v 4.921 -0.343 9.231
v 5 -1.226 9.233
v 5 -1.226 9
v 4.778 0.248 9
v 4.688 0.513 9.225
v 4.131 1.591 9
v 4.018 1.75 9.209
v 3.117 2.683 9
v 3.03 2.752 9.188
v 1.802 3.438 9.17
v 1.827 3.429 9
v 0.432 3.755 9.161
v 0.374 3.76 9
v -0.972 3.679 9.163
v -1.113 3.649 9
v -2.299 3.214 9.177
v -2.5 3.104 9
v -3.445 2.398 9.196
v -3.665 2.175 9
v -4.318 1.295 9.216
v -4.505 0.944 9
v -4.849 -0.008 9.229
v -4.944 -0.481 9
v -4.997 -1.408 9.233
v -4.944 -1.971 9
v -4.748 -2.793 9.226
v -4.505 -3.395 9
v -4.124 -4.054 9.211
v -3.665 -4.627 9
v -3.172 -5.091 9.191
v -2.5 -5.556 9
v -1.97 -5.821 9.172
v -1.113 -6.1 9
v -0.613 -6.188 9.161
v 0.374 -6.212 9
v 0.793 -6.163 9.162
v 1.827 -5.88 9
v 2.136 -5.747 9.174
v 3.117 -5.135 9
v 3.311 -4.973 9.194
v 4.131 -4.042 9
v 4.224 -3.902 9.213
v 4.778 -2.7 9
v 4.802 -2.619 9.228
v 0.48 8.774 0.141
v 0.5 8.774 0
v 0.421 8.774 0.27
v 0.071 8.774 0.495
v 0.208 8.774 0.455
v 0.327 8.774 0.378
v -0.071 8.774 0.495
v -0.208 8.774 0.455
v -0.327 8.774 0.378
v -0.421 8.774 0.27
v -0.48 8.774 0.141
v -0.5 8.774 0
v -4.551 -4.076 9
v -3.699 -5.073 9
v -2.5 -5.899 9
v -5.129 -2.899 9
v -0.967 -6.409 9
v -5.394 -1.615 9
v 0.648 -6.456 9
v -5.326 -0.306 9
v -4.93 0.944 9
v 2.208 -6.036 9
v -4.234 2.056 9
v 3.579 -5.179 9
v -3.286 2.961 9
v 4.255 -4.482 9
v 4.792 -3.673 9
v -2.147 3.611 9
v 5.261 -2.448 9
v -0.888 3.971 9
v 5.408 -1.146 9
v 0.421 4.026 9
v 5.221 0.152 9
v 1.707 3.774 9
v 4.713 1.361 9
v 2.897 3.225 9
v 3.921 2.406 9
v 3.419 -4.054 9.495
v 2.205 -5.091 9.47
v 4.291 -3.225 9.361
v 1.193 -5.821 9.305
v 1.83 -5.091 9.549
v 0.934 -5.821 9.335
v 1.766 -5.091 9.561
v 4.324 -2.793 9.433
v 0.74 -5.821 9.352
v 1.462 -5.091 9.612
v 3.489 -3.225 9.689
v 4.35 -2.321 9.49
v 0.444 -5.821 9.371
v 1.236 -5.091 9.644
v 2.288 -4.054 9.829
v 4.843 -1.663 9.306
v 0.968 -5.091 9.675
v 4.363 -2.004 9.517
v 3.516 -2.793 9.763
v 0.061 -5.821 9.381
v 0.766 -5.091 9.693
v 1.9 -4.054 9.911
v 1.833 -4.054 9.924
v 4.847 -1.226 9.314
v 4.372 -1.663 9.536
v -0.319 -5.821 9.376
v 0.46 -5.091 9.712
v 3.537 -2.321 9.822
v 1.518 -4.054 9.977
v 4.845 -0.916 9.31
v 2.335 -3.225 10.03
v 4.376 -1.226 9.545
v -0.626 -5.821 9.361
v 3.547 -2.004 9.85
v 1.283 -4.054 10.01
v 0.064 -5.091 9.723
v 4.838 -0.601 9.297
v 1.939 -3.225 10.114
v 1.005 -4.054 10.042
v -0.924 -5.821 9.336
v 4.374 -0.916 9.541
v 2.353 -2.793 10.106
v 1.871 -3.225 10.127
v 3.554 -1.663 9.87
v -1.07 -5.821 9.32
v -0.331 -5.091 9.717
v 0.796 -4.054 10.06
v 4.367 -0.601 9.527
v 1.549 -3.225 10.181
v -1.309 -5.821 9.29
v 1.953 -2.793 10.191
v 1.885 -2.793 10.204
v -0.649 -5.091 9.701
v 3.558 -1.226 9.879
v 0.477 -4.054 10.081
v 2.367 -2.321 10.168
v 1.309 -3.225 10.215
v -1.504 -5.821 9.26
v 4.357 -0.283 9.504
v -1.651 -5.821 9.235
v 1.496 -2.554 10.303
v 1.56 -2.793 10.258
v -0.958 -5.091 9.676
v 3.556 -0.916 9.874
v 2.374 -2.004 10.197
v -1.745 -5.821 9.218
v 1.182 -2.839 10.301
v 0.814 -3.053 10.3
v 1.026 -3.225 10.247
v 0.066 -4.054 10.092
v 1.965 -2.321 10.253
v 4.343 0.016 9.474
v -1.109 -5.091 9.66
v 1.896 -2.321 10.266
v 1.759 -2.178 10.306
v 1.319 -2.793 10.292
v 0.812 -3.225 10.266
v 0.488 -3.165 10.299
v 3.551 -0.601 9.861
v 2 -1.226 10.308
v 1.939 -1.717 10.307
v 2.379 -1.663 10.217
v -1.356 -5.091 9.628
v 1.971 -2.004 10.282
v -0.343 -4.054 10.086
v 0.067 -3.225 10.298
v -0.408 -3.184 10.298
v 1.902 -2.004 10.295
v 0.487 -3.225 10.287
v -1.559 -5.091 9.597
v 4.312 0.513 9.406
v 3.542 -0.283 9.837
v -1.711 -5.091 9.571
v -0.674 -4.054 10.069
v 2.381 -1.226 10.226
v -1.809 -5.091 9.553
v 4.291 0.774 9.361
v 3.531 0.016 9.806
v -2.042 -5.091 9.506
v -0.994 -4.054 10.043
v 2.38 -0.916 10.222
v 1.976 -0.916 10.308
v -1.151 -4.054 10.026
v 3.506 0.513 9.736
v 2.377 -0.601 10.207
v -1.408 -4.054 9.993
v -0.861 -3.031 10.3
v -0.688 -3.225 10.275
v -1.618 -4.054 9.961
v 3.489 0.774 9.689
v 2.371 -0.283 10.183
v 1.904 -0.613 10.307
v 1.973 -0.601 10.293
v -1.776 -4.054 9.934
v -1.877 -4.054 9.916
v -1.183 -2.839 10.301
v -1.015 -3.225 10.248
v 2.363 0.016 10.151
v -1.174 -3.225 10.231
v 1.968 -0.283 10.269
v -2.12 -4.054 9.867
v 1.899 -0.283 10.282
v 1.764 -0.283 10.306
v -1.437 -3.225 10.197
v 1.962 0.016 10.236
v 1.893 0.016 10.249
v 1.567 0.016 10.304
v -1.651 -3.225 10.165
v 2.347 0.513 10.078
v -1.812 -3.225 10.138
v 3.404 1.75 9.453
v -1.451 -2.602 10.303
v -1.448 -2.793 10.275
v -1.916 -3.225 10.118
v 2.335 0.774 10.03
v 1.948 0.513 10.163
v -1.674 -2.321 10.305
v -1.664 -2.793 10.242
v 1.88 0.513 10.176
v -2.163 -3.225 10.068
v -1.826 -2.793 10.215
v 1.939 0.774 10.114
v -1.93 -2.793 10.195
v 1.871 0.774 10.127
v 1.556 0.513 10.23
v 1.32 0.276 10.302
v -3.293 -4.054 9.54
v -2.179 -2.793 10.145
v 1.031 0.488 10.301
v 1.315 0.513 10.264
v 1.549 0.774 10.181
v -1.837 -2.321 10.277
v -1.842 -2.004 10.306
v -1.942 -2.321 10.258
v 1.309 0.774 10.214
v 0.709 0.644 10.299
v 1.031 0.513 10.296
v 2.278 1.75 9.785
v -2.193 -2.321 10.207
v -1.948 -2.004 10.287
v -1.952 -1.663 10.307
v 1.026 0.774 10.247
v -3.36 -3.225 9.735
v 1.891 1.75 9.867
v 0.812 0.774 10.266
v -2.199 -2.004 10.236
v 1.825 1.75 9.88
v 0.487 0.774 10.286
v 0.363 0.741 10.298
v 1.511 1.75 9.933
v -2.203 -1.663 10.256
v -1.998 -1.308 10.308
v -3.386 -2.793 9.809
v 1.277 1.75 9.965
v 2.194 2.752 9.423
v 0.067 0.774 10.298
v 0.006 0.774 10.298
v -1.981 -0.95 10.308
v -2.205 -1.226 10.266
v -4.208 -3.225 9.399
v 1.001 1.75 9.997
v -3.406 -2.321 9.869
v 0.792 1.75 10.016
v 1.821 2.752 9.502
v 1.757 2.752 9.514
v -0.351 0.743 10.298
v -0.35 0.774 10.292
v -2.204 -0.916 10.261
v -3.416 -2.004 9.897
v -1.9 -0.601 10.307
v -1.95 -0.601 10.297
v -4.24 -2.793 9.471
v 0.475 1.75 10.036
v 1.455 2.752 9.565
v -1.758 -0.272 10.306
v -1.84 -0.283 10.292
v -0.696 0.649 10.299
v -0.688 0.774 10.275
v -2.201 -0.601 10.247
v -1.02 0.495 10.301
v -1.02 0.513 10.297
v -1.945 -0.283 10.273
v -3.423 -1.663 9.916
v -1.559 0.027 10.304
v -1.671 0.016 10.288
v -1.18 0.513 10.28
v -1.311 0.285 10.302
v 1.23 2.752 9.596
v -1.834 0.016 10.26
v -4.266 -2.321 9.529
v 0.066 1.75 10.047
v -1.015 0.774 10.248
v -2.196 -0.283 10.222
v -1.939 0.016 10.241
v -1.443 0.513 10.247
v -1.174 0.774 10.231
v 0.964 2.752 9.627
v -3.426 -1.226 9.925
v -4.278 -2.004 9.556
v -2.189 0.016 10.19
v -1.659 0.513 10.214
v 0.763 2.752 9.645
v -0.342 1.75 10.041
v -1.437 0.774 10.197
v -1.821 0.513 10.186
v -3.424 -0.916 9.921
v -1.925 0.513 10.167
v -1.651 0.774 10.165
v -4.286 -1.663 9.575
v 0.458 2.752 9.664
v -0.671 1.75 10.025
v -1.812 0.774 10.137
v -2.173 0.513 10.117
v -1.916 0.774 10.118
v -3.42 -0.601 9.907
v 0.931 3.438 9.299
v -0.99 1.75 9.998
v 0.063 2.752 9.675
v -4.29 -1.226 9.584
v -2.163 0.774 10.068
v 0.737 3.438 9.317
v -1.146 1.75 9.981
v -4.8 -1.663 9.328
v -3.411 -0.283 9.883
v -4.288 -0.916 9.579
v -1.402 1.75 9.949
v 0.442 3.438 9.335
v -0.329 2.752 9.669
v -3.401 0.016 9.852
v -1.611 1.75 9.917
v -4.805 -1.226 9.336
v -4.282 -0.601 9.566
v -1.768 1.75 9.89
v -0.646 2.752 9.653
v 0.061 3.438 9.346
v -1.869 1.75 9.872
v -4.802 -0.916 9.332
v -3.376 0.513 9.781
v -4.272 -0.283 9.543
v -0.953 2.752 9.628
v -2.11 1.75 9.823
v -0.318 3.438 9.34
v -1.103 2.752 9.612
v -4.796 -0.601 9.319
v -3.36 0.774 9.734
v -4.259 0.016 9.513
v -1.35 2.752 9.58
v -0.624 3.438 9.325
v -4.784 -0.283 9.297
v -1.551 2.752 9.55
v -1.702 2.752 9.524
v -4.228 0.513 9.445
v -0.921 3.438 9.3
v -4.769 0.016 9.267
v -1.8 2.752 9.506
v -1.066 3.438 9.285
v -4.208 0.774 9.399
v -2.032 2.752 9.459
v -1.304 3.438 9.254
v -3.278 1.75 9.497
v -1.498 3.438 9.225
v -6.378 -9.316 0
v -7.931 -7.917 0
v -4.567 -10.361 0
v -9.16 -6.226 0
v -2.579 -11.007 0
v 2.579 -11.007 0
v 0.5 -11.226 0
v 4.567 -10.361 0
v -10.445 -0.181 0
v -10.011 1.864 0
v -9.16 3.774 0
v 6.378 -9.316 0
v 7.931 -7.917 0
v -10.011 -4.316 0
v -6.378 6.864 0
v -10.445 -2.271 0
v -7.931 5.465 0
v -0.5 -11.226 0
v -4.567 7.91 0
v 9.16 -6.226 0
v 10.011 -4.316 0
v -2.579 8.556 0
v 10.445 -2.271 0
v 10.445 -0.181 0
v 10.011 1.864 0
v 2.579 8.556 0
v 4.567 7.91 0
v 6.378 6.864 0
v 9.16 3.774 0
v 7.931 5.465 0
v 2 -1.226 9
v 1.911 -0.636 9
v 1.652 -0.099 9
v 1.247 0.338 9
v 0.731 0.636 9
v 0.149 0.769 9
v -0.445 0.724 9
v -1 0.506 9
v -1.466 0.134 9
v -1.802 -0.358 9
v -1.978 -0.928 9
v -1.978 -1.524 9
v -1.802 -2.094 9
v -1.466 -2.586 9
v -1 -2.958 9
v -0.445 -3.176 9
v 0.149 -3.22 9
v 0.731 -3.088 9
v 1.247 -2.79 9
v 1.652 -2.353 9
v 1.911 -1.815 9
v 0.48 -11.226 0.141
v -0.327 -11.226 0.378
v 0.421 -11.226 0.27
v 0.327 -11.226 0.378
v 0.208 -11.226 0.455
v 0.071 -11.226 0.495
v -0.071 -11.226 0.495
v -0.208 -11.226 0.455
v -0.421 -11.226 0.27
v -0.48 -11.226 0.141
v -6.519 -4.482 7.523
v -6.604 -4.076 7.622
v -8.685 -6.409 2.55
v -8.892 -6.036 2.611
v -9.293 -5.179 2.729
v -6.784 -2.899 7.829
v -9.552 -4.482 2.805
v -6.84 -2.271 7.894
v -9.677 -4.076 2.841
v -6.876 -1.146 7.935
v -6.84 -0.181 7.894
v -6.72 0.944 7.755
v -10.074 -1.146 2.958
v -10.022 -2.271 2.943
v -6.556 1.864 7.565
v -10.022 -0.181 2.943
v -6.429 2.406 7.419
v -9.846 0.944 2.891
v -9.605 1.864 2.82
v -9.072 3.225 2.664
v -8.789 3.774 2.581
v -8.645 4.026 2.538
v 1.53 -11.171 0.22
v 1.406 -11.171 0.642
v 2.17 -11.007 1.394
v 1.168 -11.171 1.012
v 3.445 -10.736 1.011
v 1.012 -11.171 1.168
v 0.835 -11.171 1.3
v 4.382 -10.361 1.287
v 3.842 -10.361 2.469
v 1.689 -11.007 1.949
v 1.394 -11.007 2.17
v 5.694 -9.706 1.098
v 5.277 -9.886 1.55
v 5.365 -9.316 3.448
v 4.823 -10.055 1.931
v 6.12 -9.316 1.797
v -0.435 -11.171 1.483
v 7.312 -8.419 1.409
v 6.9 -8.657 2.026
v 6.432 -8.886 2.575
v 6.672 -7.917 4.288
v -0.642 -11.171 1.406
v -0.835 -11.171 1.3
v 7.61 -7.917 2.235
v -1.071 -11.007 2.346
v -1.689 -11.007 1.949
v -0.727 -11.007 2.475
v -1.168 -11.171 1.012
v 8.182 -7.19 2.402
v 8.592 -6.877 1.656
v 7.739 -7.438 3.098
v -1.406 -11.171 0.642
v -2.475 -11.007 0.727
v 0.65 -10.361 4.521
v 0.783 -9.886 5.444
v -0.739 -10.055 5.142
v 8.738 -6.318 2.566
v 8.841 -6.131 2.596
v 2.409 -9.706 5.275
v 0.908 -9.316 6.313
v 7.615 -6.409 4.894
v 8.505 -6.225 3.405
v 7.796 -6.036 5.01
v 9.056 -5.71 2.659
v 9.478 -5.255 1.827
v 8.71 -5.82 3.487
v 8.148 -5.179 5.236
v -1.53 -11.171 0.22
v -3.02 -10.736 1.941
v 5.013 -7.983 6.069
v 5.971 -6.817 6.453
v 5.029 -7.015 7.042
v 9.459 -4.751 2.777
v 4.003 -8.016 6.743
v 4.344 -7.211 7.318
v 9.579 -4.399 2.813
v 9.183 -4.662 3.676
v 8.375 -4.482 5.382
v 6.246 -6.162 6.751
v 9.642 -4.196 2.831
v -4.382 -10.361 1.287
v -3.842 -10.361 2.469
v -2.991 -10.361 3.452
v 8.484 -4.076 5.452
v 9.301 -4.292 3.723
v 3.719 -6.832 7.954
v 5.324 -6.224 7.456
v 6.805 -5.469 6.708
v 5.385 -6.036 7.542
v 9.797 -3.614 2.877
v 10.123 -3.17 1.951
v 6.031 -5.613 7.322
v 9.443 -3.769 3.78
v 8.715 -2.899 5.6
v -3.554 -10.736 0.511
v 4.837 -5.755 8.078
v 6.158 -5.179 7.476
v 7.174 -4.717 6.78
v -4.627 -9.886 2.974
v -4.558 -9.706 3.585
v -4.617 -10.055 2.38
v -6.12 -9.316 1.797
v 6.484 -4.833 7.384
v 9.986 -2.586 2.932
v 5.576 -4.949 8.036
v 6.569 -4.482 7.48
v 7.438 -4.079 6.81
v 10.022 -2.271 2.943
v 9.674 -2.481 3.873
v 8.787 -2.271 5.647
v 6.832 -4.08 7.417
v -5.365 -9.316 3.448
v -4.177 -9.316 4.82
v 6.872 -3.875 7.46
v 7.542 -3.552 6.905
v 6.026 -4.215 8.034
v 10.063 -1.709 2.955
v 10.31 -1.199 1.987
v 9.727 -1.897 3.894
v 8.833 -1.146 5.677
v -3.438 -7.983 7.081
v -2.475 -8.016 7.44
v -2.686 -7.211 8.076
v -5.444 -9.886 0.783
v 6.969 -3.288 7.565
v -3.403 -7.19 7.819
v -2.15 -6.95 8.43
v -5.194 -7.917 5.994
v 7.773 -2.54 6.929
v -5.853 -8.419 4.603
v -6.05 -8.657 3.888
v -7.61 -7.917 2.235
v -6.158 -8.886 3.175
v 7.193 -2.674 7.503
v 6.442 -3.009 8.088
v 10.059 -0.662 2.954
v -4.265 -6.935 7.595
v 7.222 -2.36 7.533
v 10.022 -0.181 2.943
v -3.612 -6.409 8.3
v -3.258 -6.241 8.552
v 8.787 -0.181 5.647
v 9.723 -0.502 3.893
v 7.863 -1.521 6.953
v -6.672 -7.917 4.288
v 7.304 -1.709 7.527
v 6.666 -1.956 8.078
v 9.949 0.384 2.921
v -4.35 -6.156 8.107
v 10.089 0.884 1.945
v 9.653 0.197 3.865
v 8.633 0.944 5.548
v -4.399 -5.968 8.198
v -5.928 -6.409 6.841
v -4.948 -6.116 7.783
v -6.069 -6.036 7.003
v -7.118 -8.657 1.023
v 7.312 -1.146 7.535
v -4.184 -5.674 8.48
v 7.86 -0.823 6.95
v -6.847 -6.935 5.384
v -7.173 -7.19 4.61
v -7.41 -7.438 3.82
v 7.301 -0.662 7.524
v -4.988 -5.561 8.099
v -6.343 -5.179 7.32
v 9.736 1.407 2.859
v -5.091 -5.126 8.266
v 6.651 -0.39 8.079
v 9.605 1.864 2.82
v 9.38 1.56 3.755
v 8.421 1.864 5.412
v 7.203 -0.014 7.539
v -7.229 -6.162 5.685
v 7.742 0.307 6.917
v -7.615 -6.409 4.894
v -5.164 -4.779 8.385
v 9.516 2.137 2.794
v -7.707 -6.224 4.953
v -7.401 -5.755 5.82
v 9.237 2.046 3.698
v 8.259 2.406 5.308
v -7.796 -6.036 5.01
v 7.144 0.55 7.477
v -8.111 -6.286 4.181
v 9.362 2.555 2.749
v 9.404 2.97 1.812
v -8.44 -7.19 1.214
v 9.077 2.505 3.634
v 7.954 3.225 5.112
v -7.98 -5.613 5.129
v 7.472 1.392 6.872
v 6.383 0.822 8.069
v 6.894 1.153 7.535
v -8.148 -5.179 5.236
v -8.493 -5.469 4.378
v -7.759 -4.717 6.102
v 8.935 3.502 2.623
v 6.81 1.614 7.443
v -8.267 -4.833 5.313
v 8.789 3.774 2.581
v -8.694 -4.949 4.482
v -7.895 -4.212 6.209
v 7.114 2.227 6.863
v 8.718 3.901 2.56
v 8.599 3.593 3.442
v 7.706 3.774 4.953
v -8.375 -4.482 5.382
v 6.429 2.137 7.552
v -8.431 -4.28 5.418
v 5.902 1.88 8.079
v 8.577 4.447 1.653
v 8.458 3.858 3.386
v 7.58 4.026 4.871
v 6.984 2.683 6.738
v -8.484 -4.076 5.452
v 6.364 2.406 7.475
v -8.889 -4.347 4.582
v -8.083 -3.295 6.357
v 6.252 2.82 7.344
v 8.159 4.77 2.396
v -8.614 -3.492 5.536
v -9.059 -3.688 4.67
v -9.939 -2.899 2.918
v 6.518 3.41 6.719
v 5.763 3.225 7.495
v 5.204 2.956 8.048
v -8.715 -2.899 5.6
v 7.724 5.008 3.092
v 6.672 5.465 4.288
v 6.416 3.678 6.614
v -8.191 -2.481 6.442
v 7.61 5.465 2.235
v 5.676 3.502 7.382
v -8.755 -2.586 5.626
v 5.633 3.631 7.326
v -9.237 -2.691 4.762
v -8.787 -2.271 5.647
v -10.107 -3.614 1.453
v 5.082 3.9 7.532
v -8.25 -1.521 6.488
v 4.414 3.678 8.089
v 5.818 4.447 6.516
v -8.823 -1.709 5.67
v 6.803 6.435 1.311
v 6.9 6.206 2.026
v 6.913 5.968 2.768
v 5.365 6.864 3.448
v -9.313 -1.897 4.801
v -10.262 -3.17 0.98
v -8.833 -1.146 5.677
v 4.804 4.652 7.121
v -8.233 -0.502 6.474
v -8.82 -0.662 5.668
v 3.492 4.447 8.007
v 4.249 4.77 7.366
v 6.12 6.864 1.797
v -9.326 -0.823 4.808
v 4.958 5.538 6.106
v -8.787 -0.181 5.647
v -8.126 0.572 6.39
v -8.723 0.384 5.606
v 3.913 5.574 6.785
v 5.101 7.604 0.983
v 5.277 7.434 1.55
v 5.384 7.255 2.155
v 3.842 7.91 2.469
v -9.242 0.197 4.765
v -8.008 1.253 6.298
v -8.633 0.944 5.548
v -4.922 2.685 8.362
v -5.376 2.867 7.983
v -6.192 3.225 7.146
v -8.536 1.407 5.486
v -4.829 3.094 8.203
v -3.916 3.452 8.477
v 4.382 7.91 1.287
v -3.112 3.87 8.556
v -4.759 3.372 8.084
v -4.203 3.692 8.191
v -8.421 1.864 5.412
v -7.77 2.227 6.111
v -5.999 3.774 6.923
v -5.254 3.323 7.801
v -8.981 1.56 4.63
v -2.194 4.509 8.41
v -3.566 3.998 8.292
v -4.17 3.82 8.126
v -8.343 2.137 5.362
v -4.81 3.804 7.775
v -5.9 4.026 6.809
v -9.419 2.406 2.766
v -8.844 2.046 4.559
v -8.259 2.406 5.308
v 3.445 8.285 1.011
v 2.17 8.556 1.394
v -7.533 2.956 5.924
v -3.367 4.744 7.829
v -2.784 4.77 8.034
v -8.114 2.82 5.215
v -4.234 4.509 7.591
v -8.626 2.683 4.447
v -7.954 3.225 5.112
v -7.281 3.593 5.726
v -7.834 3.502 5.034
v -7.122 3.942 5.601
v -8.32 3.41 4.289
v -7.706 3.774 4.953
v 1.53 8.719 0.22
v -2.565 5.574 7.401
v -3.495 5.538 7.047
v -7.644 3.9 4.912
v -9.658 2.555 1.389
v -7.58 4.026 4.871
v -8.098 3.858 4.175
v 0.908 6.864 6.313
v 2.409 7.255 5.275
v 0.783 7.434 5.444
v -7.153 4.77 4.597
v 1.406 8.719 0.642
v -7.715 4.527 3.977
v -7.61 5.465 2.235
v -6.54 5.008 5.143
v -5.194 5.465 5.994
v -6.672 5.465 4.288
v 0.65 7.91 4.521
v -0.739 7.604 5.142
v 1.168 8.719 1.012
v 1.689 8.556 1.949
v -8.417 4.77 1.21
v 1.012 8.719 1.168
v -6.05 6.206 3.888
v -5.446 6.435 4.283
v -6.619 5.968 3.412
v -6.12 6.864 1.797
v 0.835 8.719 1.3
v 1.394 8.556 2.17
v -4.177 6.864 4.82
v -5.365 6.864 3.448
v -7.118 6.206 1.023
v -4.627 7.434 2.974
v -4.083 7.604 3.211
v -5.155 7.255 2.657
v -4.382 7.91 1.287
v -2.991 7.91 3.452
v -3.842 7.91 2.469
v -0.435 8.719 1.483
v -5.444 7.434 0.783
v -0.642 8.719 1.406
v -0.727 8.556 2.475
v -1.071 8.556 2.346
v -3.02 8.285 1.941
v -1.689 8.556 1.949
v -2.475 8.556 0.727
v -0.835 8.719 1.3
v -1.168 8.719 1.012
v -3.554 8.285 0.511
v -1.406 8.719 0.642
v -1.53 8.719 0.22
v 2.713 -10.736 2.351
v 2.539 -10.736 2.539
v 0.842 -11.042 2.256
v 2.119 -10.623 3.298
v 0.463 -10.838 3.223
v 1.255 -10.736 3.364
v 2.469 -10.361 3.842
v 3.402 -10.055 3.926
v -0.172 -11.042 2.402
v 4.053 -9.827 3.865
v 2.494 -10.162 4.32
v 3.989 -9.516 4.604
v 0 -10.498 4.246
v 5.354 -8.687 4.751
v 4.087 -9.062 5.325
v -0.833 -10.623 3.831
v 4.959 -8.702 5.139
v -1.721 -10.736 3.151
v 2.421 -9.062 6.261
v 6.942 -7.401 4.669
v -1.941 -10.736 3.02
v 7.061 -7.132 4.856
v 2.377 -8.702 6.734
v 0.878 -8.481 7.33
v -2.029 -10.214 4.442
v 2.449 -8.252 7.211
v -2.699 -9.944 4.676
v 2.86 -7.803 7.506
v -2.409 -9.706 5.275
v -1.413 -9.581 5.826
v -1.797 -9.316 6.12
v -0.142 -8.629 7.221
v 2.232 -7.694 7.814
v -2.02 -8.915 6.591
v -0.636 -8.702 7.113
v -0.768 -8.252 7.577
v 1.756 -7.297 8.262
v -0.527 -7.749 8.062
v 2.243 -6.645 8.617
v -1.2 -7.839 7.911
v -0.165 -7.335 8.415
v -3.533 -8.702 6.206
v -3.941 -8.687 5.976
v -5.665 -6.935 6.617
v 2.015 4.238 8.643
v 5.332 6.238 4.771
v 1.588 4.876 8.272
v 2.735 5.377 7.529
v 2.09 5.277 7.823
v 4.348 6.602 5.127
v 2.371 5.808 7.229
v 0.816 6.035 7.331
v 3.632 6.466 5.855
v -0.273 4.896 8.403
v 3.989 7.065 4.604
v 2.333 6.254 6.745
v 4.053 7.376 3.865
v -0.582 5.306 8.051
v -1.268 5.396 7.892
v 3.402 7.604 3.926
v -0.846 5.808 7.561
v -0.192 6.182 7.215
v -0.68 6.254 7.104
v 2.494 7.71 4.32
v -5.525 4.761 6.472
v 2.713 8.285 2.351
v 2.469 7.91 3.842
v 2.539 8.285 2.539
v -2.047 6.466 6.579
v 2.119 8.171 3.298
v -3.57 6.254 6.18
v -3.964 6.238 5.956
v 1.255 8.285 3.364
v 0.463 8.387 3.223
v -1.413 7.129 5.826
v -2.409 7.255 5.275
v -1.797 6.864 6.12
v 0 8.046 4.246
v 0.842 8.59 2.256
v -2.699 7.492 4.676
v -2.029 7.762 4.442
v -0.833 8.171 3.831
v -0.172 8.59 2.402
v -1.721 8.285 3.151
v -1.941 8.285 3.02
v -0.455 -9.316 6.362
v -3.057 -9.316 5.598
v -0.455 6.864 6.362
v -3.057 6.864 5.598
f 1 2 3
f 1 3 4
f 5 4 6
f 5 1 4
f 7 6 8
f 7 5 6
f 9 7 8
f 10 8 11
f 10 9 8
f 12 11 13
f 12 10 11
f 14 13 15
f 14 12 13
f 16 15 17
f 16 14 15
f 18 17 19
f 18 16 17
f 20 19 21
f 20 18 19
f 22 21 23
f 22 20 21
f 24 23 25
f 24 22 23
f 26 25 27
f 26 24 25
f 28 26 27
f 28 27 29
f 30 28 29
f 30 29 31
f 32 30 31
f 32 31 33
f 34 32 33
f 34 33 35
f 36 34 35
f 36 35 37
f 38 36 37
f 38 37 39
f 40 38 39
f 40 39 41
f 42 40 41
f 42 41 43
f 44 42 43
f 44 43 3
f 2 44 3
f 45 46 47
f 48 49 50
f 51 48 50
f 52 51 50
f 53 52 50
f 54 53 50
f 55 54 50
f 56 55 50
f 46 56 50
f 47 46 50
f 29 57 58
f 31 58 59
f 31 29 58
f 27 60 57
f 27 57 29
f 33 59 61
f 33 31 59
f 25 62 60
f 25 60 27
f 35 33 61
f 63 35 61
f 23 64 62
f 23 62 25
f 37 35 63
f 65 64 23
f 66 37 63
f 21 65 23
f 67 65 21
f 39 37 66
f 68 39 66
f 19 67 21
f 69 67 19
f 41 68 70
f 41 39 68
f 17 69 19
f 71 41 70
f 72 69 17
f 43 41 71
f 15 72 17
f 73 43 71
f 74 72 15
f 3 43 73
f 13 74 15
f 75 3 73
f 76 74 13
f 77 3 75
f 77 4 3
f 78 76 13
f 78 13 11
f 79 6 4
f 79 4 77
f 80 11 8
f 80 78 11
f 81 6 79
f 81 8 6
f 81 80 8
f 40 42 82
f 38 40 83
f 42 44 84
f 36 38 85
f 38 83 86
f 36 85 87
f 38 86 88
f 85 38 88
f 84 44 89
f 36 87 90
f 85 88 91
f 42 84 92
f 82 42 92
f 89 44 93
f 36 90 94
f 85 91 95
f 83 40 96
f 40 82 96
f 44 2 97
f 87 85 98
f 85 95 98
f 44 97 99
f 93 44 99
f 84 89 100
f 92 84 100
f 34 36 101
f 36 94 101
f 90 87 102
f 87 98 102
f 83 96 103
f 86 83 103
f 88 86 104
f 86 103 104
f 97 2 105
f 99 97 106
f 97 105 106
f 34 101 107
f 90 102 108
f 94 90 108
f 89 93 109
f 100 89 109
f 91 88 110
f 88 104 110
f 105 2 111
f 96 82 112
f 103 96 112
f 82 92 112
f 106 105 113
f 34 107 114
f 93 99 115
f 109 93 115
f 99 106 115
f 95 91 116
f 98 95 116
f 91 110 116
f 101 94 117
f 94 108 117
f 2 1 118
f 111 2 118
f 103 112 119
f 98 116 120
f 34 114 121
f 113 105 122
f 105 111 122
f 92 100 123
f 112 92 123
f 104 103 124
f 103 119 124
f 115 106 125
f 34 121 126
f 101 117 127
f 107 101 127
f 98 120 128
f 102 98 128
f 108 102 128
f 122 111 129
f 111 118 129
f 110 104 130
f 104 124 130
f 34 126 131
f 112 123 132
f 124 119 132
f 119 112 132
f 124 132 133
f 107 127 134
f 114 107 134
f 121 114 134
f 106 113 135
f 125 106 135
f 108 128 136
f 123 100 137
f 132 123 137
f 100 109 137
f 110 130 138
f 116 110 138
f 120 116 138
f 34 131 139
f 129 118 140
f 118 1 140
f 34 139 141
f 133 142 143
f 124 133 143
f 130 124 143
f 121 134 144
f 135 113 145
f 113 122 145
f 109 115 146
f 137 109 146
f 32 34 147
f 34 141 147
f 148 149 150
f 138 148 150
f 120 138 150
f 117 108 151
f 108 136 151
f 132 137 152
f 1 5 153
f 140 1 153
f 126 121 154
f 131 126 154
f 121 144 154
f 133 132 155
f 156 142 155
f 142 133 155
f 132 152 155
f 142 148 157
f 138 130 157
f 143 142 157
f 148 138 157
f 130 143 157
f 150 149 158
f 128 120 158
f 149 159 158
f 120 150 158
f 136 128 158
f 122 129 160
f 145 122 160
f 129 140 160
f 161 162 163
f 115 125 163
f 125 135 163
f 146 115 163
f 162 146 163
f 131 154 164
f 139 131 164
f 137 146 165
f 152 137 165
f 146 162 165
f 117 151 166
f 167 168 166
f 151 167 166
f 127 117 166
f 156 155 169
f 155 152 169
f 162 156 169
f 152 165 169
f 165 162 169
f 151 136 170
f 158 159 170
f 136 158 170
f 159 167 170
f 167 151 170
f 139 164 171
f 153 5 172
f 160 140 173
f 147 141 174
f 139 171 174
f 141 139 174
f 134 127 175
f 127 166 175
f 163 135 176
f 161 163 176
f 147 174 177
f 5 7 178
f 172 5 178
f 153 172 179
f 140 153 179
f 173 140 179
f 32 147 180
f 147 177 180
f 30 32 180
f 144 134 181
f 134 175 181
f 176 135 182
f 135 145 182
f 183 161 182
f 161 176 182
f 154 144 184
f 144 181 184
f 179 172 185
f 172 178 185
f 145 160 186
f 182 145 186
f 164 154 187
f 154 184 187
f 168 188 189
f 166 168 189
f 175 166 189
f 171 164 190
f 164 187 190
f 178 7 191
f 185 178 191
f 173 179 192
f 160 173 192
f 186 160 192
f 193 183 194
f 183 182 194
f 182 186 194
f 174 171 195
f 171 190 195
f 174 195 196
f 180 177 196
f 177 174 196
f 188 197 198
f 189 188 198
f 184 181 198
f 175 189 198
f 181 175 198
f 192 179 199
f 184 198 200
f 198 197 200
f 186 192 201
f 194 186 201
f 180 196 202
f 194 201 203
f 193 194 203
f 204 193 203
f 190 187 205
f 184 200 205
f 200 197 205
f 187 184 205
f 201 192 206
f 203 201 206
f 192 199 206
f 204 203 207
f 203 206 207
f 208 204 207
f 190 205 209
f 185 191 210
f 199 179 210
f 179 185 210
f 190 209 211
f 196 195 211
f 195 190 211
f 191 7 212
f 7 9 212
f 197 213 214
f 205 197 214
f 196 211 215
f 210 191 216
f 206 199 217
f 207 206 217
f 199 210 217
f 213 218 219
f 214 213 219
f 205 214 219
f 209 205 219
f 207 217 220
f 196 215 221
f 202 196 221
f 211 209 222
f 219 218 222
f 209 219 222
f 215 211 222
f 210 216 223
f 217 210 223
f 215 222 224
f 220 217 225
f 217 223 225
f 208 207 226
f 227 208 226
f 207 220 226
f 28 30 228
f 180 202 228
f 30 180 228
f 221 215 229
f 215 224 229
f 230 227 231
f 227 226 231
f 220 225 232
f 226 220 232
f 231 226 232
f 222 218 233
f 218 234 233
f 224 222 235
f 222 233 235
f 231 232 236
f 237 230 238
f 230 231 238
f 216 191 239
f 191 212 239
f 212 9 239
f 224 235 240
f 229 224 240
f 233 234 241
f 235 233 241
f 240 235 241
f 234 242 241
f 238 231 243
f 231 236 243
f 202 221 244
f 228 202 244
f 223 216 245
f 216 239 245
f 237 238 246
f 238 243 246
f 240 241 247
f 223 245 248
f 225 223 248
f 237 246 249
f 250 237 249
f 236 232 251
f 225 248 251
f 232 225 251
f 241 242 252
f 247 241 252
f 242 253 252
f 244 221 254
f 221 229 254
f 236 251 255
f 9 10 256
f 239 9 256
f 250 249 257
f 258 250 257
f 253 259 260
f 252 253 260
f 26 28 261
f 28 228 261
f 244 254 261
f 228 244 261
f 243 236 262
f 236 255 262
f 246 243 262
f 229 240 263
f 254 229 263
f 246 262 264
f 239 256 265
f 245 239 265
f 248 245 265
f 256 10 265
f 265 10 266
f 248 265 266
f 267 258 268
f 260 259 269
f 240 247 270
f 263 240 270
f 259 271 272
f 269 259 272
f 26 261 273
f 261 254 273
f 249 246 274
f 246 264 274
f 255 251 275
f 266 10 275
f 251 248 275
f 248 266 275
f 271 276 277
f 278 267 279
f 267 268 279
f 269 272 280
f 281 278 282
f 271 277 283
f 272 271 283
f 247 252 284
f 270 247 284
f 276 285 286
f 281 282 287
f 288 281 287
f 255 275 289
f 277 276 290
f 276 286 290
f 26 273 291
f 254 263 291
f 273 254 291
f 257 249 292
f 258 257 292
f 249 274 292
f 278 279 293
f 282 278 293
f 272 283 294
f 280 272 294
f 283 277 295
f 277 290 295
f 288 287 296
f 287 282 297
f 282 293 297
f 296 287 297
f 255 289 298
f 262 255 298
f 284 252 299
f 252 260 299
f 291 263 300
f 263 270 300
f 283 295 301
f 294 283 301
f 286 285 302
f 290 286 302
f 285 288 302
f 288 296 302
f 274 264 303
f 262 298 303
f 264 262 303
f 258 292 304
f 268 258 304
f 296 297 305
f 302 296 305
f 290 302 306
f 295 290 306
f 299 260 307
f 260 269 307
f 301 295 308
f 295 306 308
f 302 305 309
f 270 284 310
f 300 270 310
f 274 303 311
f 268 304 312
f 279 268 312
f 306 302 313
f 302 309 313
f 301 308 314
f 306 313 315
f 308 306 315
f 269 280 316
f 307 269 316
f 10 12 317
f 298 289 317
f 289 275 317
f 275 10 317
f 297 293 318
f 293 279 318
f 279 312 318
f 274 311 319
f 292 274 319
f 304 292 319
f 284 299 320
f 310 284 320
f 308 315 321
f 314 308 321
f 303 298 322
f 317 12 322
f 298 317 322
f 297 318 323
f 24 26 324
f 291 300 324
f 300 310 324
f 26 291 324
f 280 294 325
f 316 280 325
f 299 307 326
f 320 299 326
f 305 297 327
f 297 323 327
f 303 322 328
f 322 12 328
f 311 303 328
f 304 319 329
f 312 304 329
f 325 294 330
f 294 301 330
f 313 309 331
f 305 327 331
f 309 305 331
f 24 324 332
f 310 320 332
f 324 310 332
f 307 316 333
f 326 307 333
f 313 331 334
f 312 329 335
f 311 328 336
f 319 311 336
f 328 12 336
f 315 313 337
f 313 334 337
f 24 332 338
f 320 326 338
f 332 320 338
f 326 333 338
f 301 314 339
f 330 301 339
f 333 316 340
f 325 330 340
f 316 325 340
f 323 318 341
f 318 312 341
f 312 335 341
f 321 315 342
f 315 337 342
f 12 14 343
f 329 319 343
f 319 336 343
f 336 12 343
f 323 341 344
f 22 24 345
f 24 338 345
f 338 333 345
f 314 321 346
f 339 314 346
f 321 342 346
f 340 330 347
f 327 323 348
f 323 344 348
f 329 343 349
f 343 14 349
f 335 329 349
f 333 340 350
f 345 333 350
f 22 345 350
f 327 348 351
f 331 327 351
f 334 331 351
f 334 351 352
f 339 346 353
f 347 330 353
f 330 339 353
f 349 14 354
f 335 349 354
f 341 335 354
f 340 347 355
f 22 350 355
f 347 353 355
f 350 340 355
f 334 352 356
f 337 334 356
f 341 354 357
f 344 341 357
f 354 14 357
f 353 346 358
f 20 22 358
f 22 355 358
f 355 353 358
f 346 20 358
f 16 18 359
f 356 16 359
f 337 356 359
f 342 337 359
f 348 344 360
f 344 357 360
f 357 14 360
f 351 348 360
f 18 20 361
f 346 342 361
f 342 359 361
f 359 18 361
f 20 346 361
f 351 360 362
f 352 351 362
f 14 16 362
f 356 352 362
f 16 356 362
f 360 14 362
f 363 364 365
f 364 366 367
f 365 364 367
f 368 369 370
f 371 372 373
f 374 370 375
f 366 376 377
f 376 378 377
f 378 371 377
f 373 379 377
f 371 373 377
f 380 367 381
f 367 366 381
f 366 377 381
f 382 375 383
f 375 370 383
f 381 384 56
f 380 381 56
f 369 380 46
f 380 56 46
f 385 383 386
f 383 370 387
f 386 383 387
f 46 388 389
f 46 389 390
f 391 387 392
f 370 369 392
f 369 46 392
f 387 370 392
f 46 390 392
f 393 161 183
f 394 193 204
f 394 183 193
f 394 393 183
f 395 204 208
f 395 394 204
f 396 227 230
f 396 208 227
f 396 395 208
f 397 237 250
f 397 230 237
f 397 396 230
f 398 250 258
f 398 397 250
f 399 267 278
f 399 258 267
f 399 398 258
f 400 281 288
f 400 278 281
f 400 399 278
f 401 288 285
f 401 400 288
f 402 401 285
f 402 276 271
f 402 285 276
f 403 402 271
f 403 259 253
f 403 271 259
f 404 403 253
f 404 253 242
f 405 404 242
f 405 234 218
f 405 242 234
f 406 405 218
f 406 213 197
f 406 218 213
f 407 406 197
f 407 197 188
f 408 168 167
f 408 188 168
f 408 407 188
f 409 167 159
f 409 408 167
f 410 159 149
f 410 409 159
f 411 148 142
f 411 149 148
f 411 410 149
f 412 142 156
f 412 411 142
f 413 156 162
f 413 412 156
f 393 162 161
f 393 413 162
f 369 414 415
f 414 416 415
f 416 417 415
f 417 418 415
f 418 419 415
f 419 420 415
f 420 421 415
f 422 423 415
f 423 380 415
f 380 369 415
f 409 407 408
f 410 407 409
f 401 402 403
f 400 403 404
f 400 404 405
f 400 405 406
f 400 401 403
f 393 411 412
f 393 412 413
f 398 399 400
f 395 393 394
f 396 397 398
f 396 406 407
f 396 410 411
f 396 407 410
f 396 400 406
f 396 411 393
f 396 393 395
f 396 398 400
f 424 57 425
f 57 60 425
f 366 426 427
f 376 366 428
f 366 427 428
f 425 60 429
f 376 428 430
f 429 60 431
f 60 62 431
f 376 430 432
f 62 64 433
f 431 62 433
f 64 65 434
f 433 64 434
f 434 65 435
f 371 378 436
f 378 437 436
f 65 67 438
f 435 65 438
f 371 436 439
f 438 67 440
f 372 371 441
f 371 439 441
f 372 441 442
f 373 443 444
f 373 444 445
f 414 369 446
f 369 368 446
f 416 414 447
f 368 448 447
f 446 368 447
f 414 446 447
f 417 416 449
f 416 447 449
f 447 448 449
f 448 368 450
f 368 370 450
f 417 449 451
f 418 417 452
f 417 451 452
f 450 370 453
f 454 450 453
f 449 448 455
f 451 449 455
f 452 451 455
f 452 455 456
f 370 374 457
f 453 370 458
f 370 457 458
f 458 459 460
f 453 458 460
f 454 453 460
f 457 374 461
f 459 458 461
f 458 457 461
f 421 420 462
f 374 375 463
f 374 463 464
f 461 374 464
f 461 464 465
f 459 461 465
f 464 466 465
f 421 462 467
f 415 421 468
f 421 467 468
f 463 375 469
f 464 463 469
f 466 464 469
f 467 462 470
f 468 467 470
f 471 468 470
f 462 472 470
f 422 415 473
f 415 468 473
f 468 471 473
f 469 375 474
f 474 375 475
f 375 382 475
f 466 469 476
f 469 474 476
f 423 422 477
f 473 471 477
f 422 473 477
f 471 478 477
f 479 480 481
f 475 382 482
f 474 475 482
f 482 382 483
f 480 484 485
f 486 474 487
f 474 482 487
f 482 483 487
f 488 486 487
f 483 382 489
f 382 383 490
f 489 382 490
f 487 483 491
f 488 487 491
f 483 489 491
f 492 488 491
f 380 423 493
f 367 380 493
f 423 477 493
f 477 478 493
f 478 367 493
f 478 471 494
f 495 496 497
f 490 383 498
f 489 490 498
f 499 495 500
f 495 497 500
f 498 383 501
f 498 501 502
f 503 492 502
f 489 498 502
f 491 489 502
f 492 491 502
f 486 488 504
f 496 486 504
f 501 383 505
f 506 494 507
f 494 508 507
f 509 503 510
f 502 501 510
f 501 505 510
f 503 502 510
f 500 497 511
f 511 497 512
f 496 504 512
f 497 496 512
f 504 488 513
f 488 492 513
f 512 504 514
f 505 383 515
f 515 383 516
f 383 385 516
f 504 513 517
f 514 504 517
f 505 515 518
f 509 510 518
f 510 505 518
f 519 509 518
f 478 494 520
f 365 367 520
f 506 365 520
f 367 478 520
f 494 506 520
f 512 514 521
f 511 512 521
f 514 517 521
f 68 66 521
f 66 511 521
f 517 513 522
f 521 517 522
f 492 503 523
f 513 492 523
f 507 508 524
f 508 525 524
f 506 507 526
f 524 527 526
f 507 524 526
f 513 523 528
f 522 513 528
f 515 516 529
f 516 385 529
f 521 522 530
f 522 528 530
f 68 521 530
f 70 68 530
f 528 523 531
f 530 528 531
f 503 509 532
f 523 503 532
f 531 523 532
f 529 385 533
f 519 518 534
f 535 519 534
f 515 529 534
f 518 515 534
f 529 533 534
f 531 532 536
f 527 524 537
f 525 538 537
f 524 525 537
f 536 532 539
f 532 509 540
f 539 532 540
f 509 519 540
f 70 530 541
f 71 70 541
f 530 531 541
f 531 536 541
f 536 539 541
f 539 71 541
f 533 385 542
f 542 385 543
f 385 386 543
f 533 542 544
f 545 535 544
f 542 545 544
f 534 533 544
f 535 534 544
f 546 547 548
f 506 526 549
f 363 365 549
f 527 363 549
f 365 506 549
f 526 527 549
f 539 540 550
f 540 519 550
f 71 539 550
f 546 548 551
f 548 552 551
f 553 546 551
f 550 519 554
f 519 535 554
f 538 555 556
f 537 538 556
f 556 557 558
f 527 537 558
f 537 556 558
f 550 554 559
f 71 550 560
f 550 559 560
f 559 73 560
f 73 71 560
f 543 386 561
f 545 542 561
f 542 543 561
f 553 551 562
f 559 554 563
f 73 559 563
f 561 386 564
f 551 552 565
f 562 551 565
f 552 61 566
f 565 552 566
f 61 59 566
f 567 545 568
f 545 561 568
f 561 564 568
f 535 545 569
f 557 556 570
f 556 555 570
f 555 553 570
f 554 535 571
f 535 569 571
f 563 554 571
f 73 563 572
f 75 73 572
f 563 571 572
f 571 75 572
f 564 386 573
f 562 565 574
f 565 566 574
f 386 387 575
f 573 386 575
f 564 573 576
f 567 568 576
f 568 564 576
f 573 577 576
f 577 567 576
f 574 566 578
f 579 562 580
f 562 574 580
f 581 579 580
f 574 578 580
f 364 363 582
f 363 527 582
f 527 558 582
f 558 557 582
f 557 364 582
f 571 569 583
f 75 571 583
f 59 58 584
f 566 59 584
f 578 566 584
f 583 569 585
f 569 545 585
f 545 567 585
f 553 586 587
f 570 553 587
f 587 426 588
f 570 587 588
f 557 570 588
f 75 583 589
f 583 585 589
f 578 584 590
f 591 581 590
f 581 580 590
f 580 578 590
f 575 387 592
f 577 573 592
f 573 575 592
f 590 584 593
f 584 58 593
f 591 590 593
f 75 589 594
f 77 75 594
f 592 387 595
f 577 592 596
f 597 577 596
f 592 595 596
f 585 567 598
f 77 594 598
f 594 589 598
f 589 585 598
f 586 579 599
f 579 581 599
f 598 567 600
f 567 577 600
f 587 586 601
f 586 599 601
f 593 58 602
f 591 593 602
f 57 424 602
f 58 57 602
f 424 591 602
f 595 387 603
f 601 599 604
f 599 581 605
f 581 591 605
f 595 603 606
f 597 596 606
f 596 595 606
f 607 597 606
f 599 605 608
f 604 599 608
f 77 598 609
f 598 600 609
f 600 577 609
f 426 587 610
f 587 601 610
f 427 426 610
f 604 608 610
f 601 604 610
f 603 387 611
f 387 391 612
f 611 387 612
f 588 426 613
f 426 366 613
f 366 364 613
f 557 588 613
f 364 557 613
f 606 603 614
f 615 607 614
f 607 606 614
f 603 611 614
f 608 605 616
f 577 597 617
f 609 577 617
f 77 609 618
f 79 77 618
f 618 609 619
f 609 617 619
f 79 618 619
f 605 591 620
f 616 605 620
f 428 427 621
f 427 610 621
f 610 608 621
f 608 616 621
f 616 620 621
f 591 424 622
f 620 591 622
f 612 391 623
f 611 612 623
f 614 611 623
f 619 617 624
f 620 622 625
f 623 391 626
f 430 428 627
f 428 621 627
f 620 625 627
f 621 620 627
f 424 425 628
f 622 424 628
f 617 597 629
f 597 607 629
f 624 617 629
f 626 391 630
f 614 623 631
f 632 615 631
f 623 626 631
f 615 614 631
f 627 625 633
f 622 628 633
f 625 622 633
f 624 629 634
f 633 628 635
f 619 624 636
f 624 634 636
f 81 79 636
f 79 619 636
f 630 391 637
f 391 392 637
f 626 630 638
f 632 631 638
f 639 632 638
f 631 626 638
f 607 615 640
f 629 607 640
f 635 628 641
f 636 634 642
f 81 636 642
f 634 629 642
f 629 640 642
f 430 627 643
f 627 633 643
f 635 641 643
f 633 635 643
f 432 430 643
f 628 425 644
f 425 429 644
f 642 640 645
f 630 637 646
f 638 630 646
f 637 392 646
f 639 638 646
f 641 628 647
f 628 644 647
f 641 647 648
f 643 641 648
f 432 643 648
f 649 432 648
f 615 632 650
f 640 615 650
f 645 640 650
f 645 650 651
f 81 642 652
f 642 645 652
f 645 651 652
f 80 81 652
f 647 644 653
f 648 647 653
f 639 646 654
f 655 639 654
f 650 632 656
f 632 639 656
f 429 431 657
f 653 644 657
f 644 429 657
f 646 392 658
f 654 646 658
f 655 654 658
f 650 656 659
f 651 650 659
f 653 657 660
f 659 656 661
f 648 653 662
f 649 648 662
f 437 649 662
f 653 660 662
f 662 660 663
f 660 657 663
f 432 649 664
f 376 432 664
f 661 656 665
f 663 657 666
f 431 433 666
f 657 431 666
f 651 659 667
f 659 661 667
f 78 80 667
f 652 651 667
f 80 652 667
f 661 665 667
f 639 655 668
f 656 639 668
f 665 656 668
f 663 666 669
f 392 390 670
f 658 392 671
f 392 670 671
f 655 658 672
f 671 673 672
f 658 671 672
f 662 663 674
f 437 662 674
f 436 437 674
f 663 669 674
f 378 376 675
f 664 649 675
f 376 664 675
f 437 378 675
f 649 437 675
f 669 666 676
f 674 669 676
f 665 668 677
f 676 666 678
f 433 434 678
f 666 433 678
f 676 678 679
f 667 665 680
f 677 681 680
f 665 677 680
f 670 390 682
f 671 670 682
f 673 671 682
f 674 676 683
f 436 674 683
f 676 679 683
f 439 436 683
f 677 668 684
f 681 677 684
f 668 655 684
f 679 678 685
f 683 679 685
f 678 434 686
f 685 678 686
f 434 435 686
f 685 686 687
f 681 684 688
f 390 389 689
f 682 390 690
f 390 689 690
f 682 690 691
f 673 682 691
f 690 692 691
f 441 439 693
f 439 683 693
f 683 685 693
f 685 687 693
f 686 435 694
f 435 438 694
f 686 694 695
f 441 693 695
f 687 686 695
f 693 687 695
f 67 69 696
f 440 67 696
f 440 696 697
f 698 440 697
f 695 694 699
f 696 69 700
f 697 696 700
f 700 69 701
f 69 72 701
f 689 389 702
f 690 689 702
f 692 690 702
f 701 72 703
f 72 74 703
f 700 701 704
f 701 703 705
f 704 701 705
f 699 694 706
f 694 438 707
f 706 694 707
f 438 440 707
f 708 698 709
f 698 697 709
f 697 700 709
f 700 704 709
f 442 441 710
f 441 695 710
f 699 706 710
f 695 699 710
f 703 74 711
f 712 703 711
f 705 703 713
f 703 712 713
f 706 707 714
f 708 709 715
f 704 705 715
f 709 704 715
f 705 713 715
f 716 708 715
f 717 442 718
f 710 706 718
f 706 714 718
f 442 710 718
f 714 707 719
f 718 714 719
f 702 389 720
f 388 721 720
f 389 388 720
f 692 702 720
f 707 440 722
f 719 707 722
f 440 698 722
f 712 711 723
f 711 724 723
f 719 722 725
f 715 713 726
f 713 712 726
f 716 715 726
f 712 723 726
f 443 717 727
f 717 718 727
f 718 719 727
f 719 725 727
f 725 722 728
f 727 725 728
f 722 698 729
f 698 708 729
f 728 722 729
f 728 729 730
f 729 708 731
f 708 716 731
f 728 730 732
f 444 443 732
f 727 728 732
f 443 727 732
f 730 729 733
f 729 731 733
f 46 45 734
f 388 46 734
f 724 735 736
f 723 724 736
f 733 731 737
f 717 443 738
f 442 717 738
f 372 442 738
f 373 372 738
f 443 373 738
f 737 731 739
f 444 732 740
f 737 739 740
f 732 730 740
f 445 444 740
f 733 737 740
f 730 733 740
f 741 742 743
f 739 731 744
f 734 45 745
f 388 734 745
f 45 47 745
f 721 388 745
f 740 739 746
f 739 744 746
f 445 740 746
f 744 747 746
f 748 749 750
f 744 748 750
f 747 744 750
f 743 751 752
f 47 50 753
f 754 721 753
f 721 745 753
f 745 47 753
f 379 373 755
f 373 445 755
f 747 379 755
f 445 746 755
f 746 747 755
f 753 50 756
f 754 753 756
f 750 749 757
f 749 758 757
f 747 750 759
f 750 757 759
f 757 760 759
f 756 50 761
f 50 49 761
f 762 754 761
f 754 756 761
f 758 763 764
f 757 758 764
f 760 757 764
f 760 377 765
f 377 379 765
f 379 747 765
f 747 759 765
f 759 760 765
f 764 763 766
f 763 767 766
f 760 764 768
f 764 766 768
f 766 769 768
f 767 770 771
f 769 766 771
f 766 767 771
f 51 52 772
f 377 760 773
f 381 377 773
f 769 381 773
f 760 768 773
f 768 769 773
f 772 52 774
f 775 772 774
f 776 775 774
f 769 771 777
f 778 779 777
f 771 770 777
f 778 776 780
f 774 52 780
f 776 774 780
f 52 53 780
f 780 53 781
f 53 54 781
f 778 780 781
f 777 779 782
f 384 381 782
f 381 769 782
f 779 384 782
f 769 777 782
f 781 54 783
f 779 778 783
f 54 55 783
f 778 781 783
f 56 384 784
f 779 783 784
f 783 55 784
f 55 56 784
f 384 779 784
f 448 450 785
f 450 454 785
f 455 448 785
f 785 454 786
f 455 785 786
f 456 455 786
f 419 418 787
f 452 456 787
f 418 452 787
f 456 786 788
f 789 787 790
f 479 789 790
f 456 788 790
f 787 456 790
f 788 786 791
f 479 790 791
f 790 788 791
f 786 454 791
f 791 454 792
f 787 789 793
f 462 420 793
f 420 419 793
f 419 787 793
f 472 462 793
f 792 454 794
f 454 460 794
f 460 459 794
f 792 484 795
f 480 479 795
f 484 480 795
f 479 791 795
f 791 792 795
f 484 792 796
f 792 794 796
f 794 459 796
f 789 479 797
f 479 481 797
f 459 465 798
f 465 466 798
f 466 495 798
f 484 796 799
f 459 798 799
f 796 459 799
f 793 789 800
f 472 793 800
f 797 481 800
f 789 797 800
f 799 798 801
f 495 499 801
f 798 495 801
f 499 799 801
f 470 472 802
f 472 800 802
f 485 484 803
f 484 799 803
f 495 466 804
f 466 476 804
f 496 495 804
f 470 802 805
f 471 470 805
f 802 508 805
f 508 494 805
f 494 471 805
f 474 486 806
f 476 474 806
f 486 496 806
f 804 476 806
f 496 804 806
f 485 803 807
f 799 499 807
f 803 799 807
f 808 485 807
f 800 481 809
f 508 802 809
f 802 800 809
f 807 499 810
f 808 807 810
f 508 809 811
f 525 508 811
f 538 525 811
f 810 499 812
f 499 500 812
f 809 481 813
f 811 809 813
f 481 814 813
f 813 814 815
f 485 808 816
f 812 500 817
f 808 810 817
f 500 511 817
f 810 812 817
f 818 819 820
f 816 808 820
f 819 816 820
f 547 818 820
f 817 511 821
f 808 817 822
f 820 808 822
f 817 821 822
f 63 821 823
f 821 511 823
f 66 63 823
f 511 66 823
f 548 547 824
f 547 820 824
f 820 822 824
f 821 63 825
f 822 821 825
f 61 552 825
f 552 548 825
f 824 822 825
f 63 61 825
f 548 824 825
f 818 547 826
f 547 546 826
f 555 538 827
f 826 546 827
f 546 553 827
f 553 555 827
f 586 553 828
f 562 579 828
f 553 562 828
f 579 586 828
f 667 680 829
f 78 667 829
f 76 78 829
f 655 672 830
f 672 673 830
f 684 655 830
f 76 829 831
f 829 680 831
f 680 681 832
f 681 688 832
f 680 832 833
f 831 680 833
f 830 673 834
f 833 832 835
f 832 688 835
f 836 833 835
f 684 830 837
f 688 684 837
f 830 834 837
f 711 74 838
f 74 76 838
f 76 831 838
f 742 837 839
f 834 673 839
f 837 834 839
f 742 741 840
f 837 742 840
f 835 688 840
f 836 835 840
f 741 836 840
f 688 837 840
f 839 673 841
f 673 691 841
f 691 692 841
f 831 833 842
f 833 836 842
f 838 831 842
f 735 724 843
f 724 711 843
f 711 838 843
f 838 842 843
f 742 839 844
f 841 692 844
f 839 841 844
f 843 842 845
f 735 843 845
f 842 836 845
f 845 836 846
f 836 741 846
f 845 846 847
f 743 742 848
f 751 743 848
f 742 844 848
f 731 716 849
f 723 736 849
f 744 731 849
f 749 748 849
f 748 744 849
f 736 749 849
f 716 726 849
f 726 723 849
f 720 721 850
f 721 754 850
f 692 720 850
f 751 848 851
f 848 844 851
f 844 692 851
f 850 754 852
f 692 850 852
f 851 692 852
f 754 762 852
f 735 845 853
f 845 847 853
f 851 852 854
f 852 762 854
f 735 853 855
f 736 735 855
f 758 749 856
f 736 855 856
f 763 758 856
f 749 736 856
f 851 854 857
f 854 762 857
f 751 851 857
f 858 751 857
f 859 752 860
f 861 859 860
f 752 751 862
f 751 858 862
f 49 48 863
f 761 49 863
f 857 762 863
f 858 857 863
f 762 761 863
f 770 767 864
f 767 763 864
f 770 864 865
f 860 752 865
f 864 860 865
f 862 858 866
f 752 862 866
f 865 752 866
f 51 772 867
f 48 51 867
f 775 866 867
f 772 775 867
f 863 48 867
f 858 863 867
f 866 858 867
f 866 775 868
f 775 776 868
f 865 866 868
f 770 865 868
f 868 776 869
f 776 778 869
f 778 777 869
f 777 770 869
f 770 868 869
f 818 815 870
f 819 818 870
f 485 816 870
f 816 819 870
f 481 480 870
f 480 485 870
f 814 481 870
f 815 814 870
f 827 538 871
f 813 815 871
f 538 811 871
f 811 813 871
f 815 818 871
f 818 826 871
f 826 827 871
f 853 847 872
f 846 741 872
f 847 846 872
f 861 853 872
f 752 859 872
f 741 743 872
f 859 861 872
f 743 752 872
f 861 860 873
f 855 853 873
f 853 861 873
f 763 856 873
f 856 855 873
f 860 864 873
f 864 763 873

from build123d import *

# Parameters (mm, degrees)
F1_ANGLE = 180
F3_R     = 5.5
F3_R_2   = 5
F4_DEPTH = 16
F5_R     = 2
F6_DEPTH = 5


with BuildPart() as f1:
    # F0 (on Top) → F1 (revolve)
    with BuildSketch(Plane.XY):
        with BuildLine():
            Line((0, 8.77414), (0, 8.586648))
            Line((0, 8.586648), (0, -11.213352))
            Line((0, -11.213352), (0, -11.22586))
            Line((0, -11.22586), (0.5, -11.22586))
            ThreePointArc((0.5, -11.22586), (10.5, -1.22586), (0.5, 8.77414))
            Line((0.5, 8.77414), (0, 8.77414))
        make_face()
    revolve(axis=Axis((0, -1.313352, 0), (0, -1, 0)), revolution_arc=F1_ANGLE)

    # F3 (on offset) → F4 (cut)
    with BuildSketch(Plane.XY.offset(25)):
        with Locations((0, -1.22586)):
            Circle(F3_R)
        with Locations((0, -1.22586)):
            Circle(F3_R_2, mode=Mode.SUBTRACT)
    extrude(amount=-F4_DEPTH, mode=Mode.SUBTRACT)

    # F5 (on face) → F6 (cut)
    with BuildSketch(Plane.XY.offset(9)):
        with Locations((0, -1.22586)):
            Circle(F5_R)
    extrude(amount=F6_DEPTH, mode=Mode.SUBTRACT)


solid = f1.part
